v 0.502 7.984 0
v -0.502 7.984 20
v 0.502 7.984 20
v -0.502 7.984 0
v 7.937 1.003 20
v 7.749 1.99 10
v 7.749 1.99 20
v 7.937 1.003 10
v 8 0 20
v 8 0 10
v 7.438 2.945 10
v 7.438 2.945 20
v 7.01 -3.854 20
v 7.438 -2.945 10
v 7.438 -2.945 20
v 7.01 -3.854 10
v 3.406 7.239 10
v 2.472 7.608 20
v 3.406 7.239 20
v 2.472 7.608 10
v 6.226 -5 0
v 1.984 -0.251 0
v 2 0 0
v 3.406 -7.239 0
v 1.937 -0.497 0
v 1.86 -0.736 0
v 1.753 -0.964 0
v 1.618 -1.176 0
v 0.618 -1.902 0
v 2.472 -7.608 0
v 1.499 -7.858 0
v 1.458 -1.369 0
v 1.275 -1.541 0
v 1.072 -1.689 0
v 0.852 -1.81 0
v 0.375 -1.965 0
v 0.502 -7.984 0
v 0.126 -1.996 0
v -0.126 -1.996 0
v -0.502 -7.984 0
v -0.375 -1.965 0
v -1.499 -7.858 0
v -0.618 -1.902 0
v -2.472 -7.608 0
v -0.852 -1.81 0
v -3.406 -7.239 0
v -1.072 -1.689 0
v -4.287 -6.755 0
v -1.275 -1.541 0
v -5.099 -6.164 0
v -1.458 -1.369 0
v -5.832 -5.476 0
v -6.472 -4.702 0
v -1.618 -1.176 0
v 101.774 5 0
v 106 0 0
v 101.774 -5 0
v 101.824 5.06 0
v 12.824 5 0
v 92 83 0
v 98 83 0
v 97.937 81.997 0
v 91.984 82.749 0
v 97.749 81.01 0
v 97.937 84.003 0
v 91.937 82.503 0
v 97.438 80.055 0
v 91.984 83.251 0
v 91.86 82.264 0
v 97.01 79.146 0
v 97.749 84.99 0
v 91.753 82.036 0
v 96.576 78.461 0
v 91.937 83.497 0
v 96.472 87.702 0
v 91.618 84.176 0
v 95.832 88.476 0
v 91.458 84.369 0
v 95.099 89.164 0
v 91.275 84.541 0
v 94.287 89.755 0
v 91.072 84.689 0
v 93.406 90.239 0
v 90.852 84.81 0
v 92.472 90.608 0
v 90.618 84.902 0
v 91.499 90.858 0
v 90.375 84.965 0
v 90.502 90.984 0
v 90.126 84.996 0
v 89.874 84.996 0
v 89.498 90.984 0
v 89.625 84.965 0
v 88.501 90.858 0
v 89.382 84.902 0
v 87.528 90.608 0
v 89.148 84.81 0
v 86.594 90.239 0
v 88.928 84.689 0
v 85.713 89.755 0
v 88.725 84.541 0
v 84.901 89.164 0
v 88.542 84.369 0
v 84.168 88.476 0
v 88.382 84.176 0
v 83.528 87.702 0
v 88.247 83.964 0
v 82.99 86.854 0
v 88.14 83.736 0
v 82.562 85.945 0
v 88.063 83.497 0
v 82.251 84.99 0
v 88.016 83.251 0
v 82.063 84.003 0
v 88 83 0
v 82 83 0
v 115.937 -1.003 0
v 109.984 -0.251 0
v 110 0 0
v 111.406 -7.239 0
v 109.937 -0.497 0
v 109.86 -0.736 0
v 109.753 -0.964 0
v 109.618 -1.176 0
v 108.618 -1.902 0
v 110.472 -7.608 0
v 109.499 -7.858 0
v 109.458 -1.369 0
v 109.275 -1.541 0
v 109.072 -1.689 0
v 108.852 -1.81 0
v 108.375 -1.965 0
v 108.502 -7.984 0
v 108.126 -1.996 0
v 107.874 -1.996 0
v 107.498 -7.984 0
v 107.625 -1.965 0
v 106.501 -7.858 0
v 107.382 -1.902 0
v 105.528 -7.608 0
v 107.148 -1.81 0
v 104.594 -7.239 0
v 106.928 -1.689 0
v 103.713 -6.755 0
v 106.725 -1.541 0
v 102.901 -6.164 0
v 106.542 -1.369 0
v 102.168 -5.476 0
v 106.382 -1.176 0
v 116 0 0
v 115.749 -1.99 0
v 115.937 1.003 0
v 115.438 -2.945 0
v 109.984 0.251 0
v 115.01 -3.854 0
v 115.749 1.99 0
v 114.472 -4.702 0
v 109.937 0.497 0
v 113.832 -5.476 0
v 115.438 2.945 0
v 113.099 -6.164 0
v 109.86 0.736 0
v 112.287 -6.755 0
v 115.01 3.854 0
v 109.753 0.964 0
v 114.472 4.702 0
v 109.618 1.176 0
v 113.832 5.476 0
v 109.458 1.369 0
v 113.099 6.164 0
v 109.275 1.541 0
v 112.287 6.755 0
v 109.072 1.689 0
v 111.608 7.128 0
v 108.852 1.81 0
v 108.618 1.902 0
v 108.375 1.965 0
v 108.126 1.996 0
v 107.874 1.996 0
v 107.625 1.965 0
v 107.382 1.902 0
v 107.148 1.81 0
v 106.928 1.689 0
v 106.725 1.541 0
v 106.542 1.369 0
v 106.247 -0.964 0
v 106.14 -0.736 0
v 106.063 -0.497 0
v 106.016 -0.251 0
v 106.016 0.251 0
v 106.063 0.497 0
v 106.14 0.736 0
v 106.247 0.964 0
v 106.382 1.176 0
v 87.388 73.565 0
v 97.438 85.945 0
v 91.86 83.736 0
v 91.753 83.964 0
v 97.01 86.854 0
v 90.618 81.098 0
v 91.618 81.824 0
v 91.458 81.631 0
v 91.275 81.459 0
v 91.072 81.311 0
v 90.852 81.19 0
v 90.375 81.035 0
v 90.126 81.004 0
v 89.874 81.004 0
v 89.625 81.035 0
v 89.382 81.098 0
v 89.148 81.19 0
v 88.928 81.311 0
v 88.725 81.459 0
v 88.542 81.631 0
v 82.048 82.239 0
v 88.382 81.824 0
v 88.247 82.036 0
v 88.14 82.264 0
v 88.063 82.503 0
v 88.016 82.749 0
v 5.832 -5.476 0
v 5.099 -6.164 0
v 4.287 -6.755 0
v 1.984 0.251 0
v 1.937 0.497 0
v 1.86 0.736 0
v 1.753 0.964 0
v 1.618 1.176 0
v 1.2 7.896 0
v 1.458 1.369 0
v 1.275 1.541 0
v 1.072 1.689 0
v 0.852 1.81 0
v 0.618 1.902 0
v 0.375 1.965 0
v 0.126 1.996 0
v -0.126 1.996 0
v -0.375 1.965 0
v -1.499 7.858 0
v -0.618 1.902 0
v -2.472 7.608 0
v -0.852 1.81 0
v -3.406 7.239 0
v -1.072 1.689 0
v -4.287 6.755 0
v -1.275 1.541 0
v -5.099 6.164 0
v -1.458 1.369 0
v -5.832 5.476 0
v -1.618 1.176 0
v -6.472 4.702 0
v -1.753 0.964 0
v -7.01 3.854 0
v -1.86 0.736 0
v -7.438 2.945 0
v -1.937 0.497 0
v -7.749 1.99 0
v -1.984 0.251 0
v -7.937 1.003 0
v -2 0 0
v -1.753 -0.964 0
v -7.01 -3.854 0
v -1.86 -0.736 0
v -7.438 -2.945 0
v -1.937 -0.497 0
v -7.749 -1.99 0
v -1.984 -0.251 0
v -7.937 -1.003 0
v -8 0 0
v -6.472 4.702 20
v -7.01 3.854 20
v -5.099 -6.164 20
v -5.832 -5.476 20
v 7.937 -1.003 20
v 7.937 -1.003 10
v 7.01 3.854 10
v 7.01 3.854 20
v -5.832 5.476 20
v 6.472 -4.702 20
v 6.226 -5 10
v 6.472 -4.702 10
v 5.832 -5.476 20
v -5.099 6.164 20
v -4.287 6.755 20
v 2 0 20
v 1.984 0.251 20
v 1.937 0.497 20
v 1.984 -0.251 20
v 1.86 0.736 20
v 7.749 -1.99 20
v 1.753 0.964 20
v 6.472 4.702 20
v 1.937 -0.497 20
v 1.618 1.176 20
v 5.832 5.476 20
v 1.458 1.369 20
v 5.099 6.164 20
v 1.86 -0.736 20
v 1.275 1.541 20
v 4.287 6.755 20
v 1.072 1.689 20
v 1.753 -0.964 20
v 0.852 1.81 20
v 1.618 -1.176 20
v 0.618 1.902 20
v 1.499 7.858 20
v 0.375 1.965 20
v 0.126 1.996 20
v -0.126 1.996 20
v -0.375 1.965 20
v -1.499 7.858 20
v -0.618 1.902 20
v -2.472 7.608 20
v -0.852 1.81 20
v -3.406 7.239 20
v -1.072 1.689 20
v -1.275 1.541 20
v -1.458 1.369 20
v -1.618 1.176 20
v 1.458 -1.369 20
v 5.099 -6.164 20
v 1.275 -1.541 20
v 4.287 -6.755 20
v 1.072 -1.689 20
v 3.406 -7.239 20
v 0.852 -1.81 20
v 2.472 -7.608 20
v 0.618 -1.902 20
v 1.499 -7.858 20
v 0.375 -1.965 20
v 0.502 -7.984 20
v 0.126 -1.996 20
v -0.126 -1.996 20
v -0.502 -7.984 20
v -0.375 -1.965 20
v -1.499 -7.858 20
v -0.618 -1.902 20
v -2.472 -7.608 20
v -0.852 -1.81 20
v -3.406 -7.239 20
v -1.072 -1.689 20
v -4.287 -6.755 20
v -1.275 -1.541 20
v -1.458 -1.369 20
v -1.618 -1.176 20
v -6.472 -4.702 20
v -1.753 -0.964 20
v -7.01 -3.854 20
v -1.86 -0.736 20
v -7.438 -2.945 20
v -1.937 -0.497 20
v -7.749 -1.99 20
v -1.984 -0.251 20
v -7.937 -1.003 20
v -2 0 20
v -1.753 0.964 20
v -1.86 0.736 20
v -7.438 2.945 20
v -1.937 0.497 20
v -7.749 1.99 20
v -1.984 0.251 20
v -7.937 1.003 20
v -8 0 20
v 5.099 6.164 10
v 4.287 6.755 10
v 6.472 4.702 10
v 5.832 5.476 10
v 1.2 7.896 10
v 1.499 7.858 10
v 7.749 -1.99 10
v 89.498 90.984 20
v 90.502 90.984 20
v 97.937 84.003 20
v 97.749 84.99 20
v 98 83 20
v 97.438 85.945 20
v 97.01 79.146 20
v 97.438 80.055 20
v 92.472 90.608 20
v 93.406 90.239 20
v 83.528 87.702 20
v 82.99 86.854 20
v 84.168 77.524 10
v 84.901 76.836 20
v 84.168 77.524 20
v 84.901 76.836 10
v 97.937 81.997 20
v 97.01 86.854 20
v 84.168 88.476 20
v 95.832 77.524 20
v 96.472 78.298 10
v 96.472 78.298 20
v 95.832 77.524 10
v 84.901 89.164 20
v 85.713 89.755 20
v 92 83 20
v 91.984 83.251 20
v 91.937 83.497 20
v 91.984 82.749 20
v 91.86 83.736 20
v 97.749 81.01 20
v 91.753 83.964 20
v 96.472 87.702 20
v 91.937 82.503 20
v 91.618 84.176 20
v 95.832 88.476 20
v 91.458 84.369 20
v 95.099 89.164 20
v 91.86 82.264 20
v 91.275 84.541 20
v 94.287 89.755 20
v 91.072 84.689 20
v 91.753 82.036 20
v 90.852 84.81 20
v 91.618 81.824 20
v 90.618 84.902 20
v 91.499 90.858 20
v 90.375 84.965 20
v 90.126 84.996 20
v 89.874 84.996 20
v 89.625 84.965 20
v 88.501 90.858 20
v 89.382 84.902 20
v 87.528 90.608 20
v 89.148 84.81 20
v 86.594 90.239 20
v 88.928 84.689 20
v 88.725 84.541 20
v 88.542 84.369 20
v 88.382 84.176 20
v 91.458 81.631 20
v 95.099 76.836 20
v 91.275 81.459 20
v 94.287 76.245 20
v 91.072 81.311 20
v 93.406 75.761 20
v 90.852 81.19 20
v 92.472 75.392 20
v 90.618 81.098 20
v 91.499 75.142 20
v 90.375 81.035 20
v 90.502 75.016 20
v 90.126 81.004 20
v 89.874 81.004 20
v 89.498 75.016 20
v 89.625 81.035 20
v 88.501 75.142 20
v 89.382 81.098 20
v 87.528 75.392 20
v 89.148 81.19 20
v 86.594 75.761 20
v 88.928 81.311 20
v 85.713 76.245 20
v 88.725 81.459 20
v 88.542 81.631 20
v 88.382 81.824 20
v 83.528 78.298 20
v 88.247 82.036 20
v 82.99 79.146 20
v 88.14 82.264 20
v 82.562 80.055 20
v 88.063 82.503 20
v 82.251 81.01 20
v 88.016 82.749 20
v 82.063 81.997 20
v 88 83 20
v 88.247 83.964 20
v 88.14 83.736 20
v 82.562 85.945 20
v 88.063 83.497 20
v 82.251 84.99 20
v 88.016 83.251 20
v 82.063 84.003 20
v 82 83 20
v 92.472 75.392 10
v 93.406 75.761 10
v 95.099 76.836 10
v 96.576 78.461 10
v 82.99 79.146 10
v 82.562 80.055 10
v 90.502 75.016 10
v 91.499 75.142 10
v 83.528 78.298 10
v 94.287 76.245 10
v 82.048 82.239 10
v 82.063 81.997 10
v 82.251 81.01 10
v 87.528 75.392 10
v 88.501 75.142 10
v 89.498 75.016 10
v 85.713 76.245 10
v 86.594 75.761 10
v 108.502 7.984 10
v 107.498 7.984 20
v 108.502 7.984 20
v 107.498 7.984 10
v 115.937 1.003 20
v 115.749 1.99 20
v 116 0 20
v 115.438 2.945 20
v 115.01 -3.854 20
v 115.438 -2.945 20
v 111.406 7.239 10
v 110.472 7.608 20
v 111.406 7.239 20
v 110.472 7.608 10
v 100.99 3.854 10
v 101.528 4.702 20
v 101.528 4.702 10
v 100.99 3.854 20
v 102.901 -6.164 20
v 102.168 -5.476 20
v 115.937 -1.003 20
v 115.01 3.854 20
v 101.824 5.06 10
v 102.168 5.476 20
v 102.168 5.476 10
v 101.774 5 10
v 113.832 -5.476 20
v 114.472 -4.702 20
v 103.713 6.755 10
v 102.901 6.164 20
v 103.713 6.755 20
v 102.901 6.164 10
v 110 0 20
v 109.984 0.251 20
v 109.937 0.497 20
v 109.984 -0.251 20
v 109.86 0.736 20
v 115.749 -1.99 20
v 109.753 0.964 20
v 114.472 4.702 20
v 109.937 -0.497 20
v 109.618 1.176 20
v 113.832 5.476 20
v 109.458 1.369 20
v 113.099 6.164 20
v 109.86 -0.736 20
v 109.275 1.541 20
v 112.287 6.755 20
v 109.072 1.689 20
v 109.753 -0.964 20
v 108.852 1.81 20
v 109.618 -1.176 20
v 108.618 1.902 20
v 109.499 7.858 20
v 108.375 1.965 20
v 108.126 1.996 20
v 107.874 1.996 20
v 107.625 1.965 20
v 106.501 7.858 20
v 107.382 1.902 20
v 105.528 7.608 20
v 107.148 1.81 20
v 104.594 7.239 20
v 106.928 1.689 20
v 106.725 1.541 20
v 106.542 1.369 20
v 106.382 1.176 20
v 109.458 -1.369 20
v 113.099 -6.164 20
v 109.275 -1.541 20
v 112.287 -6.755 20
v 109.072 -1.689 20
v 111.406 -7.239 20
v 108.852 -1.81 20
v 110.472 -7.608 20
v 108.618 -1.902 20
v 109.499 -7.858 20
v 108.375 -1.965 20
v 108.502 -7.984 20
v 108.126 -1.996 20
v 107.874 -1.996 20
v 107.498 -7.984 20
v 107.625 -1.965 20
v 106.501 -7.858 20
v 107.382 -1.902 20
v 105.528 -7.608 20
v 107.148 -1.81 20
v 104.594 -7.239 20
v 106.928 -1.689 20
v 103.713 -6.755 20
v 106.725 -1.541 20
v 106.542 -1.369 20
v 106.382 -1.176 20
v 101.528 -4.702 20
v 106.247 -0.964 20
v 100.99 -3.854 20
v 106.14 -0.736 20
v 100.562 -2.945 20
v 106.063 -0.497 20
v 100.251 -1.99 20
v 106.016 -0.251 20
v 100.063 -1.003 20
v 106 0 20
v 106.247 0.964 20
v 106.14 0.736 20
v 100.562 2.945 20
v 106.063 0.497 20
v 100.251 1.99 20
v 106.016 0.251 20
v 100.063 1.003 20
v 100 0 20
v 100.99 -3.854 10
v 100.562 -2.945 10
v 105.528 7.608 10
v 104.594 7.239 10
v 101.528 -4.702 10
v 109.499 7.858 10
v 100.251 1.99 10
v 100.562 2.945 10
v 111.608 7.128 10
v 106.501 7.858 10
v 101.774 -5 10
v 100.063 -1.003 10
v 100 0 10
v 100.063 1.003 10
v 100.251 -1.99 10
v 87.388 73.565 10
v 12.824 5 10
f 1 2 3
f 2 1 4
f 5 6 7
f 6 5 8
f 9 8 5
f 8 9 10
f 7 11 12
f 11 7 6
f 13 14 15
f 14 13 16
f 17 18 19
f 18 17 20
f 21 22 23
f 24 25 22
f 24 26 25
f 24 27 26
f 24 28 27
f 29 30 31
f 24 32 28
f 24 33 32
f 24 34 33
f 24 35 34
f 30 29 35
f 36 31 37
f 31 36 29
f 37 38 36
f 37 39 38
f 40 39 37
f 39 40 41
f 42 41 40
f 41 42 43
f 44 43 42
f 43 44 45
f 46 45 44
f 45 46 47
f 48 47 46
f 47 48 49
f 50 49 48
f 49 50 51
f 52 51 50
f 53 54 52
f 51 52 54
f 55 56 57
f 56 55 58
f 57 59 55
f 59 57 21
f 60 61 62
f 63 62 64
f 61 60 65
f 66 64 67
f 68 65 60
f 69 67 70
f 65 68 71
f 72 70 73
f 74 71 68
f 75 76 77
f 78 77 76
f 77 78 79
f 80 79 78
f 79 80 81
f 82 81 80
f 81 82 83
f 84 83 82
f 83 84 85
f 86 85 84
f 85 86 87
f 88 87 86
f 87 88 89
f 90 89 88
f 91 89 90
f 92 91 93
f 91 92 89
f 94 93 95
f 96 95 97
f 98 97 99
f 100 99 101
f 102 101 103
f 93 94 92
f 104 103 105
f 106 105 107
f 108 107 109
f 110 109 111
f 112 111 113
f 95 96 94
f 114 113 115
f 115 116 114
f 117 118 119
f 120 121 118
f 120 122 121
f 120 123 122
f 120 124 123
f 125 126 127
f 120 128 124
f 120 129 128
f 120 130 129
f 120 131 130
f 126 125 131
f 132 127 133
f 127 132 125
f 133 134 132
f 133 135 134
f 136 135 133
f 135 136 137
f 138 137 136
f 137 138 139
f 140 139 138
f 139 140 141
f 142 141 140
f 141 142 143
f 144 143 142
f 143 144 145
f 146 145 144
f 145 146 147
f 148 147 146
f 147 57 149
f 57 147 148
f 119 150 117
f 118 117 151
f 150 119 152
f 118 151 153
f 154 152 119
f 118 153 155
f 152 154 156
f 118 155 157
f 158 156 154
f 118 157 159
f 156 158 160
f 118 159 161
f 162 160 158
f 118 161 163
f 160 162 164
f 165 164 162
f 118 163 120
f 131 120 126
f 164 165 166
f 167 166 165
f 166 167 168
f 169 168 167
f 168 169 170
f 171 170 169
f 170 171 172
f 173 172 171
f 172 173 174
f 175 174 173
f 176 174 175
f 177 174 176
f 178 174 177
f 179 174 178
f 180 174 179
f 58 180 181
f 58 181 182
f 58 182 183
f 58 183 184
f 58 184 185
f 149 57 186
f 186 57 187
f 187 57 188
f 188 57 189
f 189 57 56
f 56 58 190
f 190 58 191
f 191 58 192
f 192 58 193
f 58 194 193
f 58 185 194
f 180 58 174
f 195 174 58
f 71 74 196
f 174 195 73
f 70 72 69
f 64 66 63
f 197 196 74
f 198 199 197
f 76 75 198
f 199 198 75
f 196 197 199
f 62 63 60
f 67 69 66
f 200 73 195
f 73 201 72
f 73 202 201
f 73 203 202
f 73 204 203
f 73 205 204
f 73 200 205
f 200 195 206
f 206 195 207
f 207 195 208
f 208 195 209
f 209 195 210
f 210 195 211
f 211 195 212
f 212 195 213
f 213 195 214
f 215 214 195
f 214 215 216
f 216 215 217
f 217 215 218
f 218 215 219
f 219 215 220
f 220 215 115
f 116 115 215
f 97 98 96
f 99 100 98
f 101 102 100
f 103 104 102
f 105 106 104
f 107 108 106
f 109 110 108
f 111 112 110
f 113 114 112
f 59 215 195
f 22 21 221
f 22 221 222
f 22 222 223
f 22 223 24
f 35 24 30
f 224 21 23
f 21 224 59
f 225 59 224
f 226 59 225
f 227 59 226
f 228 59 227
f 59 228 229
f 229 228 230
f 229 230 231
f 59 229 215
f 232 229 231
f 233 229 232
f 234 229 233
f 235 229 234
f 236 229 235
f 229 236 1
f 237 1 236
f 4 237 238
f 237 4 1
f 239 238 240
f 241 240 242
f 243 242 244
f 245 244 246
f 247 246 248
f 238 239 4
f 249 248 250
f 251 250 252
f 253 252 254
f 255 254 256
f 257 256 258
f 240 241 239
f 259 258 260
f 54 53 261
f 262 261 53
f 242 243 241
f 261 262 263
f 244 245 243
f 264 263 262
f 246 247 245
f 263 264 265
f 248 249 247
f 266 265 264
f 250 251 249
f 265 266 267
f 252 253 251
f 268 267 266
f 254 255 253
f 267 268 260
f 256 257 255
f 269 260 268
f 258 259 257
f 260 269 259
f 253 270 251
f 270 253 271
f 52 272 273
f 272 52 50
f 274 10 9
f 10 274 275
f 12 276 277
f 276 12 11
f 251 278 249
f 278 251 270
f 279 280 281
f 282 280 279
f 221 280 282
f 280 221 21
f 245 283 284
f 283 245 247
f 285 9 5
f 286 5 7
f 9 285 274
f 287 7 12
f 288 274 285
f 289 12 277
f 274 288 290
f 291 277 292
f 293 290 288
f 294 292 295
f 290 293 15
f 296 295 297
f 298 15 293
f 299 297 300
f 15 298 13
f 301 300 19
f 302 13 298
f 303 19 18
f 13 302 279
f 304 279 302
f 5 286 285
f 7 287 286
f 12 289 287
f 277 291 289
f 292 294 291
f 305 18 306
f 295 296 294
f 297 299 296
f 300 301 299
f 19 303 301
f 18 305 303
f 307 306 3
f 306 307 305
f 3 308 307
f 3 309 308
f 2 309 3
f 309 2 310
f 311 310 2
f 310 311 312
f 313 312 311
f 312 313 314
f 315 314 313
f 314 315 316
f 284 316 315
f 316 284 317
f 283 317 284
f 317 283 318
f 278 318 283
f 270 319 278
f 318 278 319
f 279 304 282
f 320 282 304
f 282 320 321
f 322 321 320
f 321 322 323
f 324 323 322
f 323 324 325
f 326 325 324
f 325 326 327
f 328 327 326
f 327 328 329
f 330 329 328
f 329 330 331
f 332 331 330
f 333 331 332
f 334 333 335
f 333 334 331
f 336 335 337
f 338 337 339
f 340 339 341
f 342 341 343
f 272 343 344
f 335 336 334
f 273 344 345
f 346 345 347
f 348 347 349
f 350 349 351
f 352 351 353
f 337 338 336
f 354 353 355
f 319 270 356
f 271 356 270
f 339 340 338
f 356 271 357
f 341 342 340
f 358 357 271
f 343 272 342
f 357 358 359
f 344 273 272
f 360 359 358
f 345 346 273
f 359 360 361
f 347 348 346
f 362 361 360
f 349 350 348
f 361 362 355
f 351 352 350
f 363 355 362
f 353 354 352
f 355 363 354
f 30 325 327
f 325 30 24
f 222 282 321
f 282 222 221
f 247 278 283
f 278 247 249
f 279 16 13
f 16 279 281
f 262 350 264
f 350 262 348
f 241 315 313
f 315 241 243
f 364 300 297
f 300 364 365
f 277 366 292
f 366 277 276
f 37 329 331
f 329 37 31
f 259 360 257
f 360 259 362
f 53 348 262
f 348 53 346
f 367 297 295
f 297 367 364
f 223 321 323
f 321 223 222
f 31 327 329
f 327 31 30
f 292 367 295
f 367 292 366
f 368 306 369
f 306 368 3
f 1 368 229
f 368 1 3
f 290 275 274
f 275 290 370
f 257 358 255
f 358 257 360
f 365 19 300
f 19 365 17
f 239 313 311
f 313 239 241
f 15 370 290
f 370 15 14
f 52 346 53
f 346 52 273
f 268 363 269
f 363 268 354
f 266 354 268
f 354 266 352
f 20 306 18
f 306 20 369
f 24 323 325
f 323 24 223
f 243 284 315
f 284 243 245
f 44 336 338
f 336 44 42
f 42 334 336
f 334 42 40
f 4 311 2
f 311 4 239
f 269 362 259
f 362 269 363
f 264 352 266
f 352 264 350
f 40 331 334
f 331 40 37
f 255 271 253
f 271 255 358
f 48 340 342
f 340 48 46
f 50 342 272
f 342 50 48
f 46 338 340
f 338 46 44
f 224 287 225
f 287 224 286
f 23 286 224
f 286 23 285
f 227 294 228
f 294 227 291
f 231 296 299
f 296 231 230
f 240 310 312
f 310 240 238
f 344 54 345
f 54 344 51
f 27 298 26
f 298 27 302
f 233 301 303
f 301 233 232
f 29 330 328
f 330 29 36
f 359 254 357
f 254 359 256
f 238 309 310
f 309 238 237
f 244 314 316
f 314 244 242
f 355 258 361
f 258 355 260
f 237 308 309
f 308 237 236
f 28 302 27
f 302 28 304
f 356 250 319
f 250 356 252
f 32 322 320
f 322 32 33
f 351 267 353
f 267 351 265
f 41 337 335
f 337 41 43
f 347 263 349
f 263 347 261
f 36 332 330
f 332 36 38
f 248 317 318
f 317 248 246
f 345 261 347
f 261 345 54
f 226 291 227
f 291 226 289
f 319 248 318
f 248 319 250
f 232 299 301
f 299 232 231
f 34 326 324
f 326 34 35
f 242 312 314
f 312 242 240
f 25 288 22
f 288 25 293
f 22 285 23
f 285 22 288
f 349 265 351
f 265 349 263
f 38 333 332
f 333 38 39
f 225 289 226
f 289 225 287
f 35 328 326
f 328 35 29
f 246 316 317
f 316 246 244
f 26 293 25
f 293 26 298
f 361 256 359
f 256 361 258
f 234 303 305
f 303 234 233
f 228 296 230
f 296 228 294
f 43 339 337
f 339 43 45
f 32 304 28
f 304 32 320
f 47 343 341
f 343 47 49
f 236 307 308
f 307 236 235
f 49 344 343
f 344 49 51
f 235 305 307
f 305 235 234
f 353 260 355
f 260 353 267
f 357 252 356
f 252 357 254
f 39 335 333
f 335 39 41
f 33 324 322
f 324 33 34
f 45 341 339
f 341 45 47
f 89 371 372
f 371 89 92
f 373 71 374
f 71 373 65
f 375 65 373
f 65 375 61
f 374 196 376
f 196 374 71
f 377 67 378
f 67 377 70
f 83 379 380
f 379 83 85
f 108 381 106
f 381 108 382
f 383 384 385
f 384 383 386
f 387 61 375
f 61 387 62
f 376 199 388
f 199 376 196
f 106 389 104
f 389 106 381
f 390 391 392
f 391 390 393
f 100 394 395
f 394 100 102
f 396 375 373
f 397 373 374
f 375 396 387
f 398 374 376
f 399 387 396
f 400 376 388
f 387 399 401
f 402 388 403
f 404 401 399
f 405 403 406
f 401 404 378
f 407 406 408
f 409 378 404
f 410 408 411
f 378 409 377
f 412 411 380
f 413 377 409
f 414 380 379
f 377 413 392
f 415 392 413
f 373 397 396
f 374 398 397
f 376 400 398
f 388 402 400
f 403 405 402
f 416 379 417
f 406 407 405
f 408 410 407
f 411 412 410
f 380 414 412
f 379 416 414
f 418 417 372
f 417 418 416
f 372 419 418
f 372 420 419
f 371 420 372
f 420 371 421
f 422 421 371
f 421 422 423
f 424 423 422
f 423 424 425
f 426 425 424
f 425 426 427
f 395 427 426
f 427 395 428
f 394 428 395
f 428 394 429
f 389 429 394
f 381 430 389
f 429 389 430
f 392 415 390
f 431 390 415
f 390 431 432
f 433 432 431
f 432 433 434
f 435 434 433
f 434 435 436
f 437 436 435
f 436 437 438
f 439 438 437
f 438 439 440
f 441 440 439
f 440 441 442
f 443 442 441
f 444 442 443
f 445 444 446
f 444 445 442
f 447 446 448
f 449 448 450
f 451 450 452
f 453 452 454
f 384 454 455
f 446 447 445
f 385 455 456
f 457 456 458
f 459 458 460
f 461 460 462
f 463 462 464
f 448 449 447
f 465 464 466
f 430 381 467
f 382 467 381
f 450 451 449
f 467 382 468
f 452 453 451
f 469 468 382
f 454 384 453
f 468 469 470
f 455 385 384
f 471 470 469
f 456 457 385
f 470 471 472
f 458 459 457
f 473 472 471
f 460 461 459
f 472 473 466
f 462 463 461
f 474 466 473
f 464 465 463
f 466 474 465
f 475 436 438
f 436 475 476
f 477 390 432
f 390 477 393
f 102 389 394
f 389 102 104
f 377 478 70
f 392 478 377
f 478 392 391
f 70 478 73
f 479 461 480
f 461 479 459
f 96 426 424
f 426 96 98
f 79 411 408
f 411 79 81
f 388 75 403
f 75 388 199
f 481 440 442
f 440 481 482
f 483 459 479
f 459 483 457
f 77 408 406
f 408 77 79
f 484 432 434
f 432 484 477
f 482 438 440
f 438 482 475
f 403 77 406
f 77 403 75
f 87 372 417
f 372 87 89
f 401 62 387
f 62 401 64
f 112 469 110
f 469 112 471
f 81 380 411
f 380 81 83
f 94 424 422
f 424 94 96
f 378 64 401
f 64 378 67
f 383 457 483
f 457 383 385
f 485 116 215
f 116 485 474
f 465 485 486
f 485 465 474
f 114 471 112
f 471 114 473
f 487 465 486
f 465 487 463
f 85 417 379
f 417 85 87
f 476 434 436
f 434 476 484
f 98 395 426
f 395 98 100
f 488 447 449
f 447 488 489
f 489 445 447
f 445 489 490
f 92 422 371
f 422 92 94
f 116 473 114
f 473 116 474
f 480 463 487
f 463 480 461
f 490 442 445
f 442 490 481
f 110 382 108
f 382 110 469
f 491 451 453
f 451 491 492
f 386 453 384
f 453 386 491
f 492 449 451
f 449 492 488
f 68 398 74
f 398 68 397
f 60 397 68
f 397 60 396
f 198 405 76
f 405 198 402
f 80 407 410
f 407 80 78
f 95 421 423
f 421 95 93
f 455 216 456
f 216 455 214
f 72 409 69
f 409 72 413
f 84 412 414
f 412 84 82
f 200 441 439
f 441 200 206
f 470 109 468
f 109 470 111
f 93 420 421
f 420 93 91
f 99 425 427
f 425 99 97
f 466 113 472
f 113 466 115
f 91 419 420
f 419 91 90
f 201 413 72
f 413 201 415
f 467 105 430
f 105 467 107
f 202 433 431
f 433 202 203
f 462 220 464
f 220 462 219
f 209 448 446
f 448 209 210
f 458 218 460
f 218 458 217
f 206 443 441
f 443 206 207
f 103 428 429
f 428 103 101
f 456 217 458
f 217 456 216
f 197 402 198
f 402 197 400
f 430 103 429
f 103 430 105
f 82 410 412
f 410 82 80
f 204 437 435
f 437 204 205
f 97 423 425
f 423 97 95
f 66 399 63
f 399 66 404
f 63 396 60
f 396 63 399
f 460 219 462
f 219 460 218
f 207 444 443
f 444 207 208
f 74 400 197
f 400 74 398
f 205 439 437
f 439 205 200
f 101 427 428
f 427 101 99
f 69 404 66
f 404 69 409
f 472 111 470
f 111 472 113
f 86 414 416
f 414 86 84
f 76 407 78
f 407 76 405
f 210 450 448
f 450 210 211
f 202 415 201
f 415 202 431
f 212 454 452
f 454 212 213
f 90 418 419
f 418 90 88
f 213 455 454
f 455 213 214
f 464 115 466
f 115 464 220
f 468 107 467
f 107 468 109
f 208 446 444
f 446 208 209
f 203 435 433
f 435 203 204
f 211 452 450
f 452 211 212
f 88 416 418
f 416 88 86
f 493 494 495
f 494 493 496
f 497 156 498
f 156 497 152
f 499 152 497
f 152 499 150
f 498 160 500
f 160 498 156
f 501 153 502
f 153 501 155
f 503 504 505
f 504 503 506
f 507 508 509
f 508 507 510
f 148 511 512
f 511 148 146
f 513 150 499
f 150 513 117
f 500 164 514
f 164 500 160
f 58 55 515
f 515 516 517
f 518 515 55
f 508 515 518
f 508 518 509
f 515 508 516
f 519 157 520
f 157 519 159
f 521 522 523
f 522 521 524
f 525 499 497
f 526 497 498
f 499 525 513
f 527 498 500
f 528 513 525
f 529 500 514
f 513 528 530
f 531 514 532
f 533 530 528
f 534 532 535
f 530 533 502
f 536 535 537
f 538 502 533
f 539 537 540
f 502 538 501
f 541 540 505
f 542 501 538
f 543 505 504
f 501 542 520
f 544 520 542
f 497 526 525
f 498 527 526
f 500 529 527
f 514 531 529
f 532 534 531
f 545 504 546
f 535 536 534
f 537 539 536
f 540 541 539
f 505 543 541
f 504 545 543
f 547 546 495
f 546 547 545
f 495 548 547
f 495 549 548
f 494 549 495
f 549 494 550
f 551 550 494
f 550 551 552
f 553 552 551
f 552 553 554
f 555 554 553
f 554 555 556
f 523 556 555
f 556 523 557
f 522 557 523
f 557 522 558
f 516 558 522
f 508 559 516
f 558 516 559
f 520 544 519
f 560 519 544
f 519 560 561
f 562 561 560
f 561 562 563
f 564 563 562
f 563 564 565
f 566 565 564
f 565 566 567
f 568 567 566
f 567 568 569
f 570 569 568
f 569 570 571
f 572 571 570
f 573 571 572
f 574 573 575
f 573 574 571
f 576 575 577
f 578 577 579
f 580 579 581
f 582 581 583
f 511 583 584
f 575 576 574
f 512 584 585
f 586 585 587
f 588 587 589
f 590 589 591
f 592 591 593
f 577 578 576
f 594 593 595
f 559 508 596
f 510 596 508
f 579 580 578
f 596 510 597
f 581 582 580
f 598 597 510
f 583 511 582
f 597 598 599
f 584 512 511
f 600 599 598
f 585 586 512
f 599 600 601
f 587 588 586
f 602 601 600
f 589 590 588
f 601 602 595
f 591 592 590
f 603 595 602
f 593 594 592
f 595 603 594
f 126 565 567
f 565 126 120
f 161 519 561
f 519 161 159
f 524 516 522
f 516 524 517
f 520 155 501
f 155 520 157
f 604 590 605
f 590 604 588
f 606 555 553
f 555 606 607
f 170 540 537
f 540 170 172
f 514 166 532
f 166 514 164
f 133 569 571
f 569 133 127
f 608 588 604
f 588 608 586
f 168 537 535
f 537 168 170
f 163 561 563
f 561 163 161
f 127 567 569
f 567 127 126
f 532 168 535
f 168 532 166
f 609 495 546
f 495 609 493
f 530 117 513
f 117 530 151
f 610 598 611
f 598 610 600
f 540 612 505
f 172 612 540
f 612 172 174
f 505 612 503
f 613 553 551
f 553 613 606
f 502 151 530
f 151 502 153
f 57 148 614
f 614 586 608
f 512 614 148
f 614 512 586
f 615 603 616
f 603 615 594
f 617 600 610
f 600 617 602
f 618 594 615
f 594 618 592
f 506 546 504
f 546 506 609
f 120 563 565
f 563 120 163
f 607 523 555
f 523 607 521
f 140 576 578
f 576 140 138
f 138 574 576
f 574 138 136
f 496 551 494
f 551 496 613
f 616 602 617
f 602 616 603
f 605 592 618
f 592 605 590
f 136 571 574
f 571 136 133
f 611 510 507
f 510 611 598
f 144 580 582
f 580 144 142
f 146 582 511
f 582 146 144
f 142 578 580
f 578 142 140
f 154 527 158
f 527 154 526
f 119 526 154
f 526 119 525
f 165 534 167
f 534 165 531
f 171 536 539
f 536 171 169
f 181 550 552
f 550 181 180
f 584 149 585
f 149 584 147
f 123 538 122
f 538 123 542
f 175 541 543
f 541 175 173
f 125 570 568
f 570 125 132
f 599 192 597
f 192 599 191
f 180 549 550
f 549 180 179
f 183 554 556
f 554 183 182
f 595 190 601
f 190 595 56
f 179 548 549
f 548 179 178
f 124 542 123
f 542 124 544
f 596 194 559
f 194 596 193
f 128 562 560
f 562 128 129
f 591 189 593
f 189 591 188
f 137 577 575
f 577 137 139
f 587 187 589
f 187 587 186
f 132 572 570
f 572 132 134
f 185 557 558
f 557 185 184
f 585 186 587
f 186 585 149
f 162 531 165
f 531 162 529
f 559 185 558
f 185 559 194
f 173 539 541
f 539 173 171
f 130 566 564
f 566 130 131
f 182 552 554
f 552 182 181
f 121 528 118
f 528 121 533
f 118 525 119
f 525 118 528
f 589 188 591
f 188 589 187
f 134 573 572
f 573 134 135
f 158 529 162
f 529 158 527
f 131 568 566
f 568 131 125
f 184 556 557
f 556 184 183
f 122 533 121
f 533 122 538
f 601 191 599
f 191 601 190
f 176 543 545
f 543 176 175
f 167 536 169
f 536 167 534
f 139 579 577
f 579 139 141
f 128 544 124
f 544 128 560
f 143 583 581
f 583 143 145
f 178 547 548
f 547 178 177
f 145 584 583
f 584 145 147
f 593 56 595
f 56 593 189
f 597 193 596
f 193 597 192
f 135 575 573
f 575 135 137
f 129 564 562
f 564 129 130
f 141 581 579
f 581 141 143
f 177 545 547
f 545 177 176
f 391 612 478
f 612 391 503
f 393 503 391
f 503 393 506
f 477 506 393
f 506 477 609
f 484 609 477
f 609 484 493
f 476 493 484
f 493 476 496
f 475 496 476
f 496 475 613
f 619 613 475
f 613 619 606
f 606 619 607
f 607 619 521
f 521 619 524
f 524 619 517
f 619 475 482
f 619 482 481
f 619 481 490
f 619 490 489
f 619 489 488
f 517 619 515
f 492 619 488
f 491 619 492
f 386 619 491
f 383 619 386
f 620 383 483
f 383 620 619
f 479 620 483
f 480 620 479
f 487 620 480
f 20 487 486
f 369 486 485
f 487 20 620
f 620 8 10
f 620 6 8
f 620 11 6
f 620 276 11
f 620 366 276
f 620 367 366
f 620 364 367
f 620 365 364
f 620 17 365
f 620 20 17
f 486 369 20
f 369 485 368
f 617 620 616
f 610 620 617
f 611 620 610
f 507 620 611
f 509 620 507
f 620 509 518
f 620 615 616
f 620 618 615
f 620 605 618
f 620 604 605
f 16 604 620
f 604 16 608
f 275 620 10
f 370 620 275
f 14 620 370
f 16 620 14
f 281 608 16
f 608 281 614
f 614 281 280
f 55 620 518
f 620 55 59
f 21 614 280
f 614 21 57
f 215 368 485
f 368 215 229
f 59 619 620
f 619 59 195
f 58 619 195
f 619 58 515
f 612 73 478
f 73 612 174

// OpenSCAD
scale([1,1,2.5]){
$fn=50;

difference(){
cylinder(d=16,h=8);
translate([0,0,-1])cylinder(d=4,h=10);
}
translate([90,83,0])
difference(){
cylinder(d=16,h=8);
translate([0,0,-1])cylinder(d=4,h=10);
}
translate([108,0,0])
difference(){
cylinder(d=16,h=8);
translate([0,0,-1])cylinder(d=4,h=10);
}

translate([3,-5,0])cube([102,10,4]);

rotate([0,0,42.6])
translate([3,-5,0])cube([116,10,4]);

translate([108,0,0])rotate([0,0,101.9])
translate([3,-5,0])cube([78,10,4]);
}
